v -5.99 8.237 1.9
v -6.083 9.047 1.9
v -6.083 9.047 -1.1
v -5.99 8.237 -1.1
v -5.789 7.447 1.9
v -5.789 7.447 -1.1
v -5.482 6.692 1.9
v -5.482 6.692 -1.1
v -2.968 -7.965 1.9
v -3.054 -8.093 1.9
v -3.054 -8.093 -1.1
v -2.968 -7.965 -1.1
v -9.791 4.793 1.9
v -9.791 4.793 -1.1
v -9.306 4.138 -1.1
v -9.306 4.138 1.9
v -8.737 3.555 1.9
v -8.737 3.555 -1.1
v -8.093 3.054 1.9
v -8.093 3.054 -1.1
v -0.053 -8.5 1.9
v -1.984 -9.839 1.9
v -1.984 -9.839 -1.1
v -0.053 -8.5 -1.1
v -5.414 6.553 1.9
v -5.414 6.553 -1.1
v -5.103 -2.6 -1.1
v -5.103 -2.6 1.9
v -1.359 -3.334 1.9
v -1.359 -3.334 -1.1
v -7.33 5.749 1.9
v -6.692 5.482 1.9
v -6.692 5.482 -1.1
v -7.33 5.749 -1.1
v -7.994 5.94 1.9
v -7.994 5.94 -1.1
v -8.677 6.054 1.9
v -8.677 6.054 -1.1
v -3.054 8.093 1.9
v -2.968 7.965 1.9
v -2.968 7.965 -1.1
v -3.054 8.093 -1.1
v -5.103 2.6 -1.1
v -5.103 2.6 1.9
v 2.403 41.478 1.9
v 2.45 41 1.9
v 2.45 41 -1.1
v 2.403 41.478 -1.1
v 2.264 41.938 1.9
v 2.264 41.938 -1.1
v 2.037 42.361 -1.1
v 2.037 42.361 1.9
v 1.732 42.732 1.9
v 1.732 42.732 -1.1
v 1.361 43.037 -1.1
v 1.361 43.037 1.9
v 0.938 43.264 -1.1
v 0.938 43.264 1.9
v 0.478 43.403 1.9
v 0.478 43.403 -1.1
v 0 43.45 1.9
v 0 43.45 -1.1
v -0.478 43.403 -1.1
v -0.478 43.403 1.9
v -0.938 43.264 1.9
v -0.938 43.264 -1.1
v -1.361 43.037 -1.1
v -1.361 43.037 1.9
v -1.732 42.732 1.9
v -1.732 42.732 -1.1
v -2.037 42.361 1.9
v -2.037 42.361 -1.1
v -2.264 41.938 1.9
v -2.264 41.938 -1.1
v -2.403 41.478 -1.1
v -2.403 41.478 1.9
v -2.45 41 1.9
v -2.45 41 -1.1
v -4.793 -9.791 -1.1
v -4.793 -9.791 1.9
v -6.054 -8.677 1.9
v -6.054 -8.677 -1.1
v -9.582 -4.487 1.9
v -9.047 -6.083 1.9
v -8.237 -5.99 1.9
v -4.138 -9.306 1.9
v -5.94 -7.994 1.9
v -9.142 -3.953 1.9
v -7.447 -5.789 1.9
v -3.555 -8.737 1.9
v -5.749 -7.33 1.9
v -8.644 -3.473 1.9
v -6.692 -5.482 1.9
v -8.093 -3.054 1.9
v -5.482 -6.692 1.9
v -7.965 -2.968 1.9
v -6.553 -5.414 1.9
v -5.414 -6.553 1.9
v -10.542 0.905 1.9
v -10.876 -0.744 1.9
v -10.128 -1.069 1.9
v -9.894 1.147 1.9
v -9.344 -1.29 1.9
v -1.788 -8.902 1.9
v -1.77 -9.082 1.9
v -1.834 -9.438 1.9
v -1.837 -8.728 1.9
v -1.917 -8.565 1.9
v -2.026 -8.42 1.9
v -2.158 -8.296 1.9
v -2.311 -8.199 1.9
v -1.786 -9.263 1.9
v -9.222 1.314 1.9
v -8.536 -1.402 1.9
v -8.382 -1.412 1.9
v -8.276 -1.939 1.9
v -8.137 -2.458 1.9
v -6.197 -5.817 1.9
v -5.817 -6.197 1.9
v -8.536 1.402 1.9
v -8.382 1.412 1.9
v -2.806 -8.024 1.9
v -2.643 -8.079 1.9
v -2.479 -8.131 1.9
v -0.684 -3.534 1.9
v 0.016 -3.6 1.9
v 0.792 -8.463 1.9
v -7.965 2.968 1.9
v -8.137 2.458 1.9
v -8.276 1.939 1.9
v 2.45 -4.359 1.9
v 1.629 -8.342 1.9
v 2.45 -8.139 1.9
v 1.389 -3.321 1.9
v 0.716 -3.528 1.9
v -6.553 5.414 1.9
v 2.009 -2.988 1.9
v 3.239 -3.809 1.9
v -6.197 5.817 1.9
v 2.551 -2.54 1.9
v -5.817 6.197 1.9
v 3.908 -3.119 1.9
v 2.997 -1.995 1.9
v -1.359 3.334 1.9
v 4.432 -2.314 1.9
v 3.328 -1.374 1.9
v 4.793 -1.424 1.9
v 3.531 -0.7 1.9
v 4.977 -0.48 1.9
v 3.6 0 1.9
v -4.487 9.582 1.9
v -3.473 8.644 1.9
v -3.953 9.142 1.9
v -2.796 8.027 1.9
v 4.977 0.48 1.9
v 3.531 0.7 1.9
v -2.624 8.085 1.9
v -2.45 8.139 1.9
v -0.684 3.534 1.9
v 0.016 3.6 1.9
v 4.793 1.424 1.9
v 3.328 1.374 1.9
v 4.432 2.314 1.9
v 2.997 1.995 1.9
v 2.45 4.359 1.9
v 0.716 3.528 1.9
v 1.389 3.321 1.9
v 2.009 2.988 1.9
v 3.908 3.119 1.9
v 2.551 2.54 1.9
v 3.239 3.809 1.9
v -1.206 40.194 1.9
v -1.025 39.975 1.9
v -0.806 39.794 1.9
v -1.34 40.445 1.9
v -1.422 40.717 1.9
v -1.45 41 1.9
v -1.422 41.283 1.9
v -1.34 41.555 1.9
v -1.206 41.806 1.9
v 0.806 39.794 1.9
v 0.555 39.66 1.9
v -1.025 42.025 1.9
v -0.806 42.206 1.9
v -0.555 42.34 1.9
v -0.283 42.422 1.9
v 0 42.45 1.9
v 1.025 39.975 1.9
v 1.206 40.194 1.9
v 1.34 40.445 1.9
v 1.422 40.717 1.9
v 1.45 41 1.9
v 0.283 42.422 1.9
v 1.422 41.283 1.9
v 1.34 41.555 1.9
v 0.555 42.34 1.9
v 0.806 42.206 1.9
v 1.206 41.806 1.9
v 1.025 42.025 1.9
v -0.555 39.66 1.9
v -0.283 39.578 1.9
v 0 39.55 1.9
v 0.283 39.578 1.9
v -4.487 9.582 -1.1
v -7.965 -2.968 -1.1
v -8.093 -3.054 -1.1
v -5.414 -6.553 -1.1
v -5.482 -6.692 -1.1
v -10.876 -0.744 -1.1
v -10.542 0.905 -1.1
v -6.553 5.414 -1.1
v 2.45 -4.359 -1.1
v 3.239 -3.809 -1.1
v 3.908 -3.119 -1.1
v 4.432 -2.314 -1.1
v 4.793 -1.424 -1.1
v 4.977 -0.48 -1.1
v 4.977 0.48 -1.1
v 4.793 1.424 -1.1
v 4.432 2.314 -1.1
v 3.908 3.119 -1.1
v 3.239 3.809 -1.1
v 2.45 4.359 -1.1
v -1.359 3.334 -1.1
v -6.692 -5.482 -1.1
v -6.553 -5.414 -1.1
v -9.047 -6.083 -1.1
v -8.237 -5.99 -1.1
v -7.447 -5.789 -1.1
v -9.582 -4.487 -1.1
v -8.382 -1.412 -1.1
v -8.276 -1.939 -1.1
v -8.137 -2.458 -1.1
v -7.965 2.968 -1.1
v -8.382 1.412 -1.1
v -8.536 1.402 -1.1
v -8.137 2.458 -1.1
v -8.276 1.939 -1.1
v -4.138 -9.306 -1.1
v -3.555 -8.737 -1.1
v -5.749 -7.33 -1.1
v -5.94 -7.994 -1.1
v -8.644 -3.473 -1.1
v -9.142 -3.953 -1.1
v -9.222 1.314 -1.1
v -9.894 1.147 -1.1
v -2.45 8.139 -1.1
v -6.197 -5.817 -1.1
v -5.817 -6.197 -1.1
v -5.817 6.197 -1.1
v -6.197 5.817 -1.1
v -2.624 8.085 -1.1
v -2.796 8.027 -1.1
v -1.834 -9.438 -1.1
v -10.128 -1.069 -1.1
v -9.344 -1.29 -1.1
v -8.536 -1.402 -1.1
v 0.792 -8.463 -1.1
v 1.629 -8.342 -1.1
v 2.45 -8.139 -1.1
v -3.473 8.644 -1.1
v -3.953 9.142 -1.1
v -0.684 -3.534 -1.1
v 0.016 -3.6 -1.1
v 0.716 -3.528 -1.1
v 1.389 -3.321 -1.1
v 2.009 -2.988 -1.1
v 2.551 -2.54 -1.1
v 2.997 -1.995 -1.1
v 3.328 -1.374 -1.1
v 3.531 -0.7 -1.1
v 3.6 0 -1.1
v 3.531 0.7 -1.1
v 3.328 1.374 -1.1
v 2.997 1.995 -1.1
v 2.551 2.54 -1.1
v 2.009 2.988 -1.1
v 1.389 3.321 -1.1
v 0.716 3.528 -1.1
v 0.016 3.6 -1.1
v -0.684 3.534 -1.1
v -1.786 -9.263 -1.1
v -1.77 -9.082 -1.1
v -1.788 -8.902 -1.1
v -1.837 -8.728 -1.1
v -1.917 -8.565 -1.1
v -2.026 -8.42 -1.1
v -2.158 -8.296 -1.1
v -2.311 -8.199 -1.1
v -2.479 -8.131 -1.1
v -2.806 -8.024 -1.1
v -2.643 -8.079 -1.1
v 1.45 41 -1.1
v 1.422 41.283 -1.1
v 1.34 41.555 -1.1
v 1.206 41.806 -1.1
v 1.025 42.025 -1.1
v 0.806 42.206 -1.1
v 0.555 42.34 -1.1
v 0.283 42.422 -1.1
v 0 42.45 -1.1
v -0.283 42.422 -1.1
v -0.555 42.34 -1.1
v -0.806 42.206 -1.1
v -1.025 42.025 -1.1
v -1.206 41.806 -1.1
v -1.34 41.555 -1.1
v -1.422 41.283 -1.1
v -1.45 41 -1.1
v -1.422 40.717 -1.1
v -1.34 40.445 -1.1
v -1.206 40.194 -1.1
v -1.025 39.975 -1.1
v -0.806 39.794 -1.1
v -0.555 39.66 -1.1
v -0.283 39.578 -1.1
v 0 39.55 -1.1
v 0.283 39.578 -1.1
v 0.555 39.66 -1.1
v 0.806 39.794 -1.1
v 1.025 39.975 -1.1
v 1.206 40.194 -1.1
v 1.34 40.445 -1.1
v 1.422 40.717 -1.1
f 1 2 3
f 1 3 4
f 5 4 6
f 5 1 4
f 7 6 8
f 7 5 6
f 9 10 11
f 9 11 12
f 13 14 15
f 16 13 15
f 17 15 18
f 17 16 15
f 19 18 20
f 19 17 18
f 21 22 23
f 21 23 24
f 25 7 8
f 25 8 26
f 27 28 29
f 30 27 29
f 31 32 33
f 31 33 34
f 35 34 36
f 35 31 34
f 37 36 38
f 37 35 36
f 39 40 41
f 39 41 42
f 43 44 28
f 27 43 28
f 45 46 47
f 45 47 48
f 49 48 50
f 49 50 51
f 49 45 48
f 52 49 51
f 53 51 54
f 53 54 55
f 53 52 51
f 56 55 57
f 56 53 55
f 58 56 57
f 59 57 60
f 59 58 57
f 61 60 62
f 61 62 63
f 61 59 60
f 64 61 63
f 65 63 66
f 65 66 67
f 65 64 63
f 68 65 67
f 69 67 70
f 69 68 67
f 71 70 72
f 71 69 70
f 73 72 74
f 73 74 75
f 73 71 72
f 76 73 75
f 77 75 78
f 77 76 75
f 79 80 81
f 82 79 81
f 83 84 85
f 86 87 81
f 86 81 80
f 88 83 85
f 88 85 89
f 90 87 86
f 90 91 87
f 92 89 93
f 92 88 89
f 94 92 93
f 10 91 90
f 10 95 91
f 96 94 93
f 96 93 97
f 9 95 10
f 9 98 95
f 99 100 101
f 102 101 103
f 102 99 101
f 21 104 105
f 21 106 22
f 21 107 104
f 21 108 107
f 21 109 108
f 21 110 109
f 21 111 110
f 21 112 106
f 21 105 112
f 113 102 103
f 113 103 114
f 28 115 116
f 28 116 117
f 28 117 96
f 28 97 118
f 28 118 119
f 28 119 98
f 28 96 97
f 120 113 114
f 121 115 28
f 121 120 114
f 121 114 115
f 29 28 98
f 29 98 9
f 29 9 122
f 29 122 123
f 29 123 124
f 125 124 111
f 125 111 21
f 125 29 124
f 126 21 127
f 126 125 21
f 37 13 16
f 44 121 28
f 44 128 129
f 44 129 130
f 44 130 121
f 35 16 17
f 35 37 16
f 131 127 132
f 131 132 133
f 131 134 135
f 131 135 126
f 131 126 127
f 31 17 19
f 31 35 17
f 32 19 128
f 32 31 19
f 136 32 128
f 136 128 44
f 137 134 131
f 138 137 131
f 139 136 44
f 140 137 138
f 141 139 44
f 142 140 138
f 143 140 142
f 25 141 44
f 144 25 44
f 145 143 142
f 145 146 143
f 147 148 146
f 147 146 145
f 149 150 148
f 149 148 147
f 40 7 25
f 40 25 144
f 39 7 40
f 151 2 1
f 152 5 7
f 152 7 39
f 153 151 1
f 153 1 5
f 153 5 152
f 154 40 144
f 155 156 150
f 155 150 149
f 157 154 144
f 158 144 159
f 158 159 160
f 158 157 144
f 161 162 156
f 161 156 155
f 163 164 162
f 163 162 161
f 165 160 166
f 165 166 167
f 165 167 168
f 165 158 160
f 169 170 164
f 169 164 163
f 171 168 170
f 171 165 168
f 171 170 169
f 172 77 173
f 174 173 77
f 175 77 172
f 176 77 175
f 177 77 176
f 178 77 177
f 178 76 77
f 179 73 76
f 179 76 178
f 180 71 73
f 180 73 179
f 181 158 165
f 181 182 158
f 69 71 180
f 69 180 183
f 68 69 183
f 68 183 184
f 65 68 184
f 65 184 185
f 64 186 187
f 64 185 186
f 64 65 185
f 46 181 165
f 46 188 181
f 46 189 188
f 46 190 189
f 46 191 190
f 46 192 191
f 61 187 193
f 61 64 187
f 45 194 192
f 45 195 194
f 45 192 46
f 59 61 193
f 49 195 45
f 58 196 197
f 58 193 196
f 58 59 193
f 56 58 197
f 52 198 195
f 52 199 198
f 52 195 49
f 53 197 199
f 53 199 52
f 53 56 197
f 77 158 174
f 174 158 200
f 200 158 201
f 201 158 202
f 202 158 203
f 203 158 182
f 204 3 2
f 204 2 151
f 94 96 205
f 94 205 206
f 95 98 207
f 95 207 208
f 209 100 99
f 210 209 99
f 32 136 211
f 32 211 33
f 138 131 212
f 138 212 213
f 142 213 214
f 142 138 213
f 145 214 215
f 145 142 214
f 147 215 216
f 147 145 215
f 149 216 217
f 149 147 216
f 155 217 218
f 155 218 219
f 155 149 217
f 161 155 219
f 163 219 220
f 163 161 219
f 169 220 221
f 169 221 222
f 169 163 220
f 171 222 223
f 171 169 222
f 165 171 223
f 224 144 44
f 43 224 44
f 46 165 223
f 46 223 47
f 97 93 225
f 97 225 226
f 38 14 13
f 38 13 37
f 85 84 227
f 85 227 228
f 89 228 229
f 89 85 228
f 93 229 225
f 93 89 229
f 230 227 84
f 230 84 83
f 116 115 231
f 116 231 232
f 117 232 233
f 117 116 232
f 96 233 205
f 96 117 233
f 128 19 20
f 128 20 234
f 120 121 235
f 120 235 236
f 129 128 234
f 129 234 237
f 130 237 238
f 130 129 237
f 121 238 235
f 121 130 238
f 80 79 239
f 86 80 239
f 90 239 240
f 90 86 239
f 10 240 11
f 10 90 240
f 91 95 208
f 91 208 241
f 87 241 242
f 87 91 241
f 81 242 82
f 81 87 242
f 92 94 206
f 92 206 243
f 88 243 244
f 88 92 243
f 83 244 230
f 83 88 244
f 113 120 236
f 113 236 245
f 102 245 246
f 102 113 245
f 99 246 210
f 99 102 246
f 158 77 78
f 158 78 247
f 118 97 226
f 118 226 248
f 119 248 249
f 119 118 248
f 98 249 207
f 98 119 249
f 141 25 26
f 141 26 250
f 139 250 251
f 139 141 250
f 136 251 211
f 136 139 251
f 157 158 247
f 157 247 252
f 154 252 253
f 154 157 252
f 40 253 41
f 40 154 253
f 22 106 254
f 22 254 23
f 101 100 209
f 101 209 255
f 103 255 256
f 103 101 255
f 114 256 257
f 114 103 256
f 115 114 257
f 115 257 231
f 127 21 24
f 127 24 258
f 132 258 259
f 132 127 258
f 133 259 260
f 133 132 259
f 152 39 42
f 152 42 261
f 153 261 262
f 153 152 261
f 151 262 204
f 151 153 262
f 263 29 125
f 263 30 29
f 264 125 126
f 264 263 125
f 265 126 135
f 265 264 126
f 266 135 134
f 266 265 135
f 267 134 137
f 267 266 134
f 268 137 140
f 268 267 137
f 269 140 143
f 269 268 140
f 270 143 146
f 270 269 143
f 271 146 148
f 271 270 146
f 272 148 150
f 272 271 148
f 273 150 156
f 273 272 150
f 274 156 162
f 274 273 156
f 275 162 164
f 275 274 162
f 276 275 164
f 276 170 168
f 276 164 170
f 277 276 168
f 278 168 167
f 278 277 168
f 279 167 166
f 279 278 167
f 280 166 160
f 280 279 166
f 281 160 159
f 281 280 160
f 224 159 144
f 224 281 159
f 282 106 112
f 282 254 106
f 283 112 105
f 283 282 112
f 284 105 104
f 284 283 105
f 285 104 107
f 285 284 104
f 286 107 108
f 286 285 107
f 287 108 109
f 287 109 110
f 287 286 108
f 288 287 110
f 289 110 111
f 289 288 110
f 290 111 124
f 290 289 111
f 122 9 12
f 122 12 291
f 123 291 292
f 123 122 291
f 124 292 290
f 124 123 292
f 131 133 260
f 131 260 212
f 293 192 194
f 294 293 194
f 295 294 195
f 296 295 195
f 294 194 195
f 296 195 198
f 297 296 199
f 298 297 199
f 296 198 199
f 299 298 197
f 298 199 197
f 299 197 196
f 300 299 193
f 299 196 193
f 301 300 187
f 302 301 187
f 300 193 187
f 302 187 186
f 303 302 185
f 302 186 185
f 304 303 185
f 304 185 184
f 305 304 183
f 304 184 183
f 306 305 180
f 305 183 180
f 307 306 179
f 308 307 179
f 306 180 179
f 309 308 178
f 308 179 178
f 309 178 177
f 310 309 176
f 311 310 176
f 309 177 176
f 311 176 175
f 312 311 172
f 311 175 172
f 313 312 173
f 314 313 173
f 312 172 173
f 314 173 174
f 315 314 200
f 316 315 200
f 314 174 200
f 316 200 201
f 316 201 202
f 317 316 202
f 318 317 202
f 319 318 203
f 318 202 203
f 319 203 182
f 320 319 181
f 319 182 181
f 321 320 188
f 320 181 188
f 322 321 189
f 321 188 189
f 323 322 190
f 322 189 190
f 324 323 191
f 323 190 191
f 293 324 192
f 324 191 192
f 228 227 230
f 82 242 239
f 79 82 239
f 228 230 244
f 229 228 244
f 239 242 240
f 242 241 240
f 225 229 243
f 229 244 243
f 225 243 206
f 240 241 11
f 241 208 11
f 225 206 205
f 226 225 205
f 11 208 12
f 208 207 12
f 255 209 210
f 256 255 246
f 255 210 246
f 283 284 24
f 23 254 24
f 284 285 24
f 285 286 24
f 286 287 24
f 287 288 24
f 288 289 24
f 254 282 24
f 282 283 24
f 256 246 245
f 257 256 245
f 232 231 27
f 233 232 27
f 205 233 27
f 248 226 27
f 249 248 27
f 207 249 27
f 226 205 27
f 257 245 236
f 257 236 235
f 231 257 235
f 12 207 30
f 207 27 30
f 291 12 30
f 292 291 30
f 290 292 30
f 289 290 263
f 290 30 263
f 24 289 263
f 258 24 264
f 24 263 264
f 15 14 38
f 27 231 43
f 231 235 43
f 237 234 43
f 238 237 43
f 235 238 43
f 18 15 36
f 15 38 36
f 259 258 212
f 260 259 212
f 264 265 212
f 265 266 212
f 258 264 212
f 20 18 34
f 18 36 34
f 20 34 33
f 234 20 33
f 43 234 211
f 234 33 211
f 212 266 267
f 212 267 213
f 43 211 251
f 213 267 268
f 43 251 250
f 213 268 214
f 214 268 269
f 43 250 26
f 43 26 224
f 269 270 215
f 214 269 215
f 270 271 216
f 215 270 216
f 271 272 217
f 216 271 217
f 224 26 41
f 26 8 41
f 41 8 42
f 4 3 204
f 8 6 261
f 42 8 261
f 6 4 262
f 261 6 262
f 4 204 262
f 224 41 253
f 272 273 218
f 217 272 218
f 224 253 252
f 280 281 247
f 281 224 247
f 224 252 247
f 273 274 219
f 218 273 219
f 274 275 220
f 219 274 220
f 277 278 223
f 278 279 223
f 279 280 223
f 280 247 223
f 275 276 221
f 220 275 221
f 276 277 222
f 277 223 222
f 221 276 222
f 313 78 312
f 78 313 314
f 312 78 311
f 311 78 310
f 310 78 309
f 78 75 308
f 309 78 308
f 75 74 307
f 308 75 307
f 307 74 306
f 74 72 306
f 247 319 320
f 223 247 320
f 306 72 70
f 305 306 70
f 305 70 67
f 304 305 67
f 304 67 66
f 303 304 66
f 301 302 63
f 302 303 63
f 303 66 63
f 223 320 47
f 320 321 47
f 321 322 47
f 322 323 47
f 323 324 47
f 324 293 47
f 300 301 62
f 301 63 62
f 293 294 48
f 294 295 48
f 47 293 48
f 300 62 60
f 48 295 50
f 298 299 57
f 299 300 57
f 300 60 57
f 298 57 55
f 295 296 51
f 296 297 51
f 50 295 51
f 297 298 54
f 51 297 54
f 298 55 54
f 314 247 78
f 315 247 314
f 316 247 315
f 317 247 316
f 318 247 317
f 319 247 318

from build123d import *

# Parameters (mm, degrees)
SKETCH1_R           = 1.45
BOSS_EXTRUDE1_DEPTH = 3
CUT_EXTRUDE2_DEPTH  = 46.173463436
SKETCH5_W           = 3.6
SKETCH5_H           = 3
FILLET1_R           = 1


with BuildPart() as part:
    # Sketch1 → Boss-Extrude1 (new body)
    with BuildSketch(Plane.XY.offset(1.9)):
        with BuildLine():
            Line((2.45, -8.139256723), (2.45, -4.358612164))
            ThreePointArc((2.45, -4.358612164), (5, 0), (2.45, 4.358612164))
            Line((2.45, 4.358612164), (2.45, 41))
            ThreePointArc((2.45, 41), (0, 43.45), (-2.45, 41))
            Line((-2.45, 41), (-2.45, 8.139256723))
            ThreePointArc((-2.45, 8.139256723), (-2.710254715, 8.056334116), (-2.967710696, 7.965092167))
            Line((-2.967710696, 7.965092167), (-3.054167872, 8.093270203))
            ThreePointArc((-3.054167872, 8.093270203), (-4.342095244, 9.472160372), (-5.994566265, 10.382893341))
            ThreePointArc((-5.994566265, 10.382893341), (-6.032083889, 8.496444973), (-5.481893659, 6.691622066))
            Line((-5.481893659, 6.691622066), (-5.414116812, 6.552658937))
            ThreePointArc((-5.414116812, 6.552658937), (-6.01040764, 6.01040764), (-6.552658937, 5.414116812))
            Line((-6.552658937, 5.414116812), (-6.691622066, 5.481893659))
            ThreePointArc((-6.691622066, 5.481893659), (-8.496444973, 6.032083889), (-10.382893341, 5.994566265))
            ThreePointArc((-10.382893341, 5.994566265), (-9.472160372, 4.342095244), (-8.093270203, 3.054167872))
            Line((-8.093270203, 3.054167872), (-7.965092167, 2.967710696))
            ThreePointArc((-7.965092167, 2.967710696), (-8.210369523, 2.199961883), (-8.381827508, 1.41243323))
            Line((-8.381827508, 1.41243323), (-8.536061531, 1.401648136))
            ThreePointArc((-8.536061531, 1.401648136), (-10.374179133, 0.975715399), (-11.989132531, 0))
            ThreePointArc((-11.989132531, 0), (-10.374179133, -0.975715399), (-8.536061531, -1.401648136))
            Line((-8.536061531, -1.401648136), (-8.381827508, -1.41243323))
            ThreePointArc((-8.381827508, -1.41243323), (-8.210369523, -2.199961883), (-7.965092167, -2.967710696))
            Line((-7.965092167, -2.967710696), (-8.093270203, -3.054167872))
            ThreePointArc((-8.093270203, -3.054167872), (-9.472160372, -4.342095244), (-10.382893341, -5.994566265))
            ThreePointArc((-10.382893341, -5.994566265), (-8.496444973, -6.032083889), (-6.691622066, -5.481893659))
            Line((-6.691622066, -5.481893659), (-6.552658937, -5.414116812))
            ThreePointArc((-6.552658937, -5.414116812), (-6.01040764, -6.01040764), (-5.414116812, -6.552658937))
            Line((-5.414116812, -6.552658937), (-5.481893659, -6.691622066))
            ThreePointArc((-5.481893659, -6.691622066), (-6.032083889, -8.496444973), (-5.994566265, -10.382893341))
            ThreePointArc((-5.994566265, -10.382893341), (-4.342095244, -9.472160372), (-3.054167872, -8.093270203))
            Line((-3.054167872, -8.093270203), (-2.967710696, -7.965092167))
            ThreePointArc((-2.967710696, -7.965092167), (-2.212026244, -8.207127384), (-1.437064557, -8.377639611))
            Line((-1.437064557, -8.377639611), (-1.984198903, -9.839001099))
            Line((-1.984198903, -9.839001099), (-0.052960828, -8.499835007))
            ThreePointArc((-0.052960828, -8.499835007), (1.212003867, -8.413147249), (2.45, -8.139256723))
        make_face()
        with Locations((0, 41)):
            Circle(SKETCH1_R, mode=Mode.SUBTRACT)
    extrude(amount=-BOSS_EXTRUDE1_DEPTH)

    # Sketch4 → Cut-Extrude2 (cut, through all)
    with BuildSketch(Plane.XY.offset(1.9)):
        with BuildLine():
            Line((-5.102940329, -2.6), (-1.358771093, -3.333727811))
            ThreePointArc((-1.358771093, -3.333727811), (-3.6, 0), (-1.358771093, 3.333727811))
            Line((-1.358771093, 3.333727811), (-5.102940329, 2.6))
            Line((-5.102940329, 2.6), (-5.102940329, -2.6))
        make_face()
    extrude(amount=-CUT_EXTRUDE2_DEPTH, mode=Mode.SUBTRACT)

    # Sketch5 → Cut-Revolve1 (revolve, cut)
    with BuildSketch(Plane(origin=(0, 0, 0), x_dir=(1, 0, 0), z_dir=(0, 1, 0))):
        with Locations((1.8, -0.4)):
            Rectangle(SKETCH5_W, SKETCH5_H)
    revolve(axis=Axis((0, 0, -1.1), (0, 0, 1)), mode=Mode.SUBTRACT)

    # Chamfer1
    # the kernel refuses this chamfer: 1.996823512, 1.412365401 mm, written as the material it takes off along each edge
    with BuildSketch(Plane(origin=(-5.994566265, -10.382893341, 6.307600342), x_dir=(0.8971018613244867, 0.44182377754953556, 0), z_dir=(0, 0, -1)), Plane(origin=(-10.382893341, -5.994566265, 6.307600342), x_dir=(0.9978248904640776, -0.06592031530834441, 0), z_dir=(0, 0, -1)), Plane(origin=(-11.989132531, 0, 6.307600342), x_dir=(0.8311815460161395, -0.5560011129145519, 0), z_dir=(0, 0, -1)), Plane(origin=(-10.382893341, 5.994566265, 6.307600342), x_dir=(0.4418237775496057, -0.8971018613244522, 0), z_dir=(0, 0, -1)), Plane(origin=(-5.994566265, 10.382893341, 6.307600342), x_dir=(-0.06592031530837167, -0.9978248904640757, 0), z_dir=(0, 0, -1))) as chamfer1_piece_1:
        with BuildLine():
            Line((1.33889649, 0), (0.700148491, -1.556942978))
            ThreePointArc((0.700148491, -1.556942978), (0.305807457, -0.828670891), (0, 0))
            ThreePointArc((0, 0), (0.684607685, 0.037444556), (1.33889649, 0))
        make_face()
    extrude(amount=11.815200684, mode=Mode.SUBTRACT)

    # Fillet1
    fillet1_edges = [part.edges().sort_by_distance(p)[0] for p in [
        (-1.437064557, -8.377639611, 0.4),
    ]]
    fillet(fillet1_edges, radius=FILLET1_R)


solid = part.part
